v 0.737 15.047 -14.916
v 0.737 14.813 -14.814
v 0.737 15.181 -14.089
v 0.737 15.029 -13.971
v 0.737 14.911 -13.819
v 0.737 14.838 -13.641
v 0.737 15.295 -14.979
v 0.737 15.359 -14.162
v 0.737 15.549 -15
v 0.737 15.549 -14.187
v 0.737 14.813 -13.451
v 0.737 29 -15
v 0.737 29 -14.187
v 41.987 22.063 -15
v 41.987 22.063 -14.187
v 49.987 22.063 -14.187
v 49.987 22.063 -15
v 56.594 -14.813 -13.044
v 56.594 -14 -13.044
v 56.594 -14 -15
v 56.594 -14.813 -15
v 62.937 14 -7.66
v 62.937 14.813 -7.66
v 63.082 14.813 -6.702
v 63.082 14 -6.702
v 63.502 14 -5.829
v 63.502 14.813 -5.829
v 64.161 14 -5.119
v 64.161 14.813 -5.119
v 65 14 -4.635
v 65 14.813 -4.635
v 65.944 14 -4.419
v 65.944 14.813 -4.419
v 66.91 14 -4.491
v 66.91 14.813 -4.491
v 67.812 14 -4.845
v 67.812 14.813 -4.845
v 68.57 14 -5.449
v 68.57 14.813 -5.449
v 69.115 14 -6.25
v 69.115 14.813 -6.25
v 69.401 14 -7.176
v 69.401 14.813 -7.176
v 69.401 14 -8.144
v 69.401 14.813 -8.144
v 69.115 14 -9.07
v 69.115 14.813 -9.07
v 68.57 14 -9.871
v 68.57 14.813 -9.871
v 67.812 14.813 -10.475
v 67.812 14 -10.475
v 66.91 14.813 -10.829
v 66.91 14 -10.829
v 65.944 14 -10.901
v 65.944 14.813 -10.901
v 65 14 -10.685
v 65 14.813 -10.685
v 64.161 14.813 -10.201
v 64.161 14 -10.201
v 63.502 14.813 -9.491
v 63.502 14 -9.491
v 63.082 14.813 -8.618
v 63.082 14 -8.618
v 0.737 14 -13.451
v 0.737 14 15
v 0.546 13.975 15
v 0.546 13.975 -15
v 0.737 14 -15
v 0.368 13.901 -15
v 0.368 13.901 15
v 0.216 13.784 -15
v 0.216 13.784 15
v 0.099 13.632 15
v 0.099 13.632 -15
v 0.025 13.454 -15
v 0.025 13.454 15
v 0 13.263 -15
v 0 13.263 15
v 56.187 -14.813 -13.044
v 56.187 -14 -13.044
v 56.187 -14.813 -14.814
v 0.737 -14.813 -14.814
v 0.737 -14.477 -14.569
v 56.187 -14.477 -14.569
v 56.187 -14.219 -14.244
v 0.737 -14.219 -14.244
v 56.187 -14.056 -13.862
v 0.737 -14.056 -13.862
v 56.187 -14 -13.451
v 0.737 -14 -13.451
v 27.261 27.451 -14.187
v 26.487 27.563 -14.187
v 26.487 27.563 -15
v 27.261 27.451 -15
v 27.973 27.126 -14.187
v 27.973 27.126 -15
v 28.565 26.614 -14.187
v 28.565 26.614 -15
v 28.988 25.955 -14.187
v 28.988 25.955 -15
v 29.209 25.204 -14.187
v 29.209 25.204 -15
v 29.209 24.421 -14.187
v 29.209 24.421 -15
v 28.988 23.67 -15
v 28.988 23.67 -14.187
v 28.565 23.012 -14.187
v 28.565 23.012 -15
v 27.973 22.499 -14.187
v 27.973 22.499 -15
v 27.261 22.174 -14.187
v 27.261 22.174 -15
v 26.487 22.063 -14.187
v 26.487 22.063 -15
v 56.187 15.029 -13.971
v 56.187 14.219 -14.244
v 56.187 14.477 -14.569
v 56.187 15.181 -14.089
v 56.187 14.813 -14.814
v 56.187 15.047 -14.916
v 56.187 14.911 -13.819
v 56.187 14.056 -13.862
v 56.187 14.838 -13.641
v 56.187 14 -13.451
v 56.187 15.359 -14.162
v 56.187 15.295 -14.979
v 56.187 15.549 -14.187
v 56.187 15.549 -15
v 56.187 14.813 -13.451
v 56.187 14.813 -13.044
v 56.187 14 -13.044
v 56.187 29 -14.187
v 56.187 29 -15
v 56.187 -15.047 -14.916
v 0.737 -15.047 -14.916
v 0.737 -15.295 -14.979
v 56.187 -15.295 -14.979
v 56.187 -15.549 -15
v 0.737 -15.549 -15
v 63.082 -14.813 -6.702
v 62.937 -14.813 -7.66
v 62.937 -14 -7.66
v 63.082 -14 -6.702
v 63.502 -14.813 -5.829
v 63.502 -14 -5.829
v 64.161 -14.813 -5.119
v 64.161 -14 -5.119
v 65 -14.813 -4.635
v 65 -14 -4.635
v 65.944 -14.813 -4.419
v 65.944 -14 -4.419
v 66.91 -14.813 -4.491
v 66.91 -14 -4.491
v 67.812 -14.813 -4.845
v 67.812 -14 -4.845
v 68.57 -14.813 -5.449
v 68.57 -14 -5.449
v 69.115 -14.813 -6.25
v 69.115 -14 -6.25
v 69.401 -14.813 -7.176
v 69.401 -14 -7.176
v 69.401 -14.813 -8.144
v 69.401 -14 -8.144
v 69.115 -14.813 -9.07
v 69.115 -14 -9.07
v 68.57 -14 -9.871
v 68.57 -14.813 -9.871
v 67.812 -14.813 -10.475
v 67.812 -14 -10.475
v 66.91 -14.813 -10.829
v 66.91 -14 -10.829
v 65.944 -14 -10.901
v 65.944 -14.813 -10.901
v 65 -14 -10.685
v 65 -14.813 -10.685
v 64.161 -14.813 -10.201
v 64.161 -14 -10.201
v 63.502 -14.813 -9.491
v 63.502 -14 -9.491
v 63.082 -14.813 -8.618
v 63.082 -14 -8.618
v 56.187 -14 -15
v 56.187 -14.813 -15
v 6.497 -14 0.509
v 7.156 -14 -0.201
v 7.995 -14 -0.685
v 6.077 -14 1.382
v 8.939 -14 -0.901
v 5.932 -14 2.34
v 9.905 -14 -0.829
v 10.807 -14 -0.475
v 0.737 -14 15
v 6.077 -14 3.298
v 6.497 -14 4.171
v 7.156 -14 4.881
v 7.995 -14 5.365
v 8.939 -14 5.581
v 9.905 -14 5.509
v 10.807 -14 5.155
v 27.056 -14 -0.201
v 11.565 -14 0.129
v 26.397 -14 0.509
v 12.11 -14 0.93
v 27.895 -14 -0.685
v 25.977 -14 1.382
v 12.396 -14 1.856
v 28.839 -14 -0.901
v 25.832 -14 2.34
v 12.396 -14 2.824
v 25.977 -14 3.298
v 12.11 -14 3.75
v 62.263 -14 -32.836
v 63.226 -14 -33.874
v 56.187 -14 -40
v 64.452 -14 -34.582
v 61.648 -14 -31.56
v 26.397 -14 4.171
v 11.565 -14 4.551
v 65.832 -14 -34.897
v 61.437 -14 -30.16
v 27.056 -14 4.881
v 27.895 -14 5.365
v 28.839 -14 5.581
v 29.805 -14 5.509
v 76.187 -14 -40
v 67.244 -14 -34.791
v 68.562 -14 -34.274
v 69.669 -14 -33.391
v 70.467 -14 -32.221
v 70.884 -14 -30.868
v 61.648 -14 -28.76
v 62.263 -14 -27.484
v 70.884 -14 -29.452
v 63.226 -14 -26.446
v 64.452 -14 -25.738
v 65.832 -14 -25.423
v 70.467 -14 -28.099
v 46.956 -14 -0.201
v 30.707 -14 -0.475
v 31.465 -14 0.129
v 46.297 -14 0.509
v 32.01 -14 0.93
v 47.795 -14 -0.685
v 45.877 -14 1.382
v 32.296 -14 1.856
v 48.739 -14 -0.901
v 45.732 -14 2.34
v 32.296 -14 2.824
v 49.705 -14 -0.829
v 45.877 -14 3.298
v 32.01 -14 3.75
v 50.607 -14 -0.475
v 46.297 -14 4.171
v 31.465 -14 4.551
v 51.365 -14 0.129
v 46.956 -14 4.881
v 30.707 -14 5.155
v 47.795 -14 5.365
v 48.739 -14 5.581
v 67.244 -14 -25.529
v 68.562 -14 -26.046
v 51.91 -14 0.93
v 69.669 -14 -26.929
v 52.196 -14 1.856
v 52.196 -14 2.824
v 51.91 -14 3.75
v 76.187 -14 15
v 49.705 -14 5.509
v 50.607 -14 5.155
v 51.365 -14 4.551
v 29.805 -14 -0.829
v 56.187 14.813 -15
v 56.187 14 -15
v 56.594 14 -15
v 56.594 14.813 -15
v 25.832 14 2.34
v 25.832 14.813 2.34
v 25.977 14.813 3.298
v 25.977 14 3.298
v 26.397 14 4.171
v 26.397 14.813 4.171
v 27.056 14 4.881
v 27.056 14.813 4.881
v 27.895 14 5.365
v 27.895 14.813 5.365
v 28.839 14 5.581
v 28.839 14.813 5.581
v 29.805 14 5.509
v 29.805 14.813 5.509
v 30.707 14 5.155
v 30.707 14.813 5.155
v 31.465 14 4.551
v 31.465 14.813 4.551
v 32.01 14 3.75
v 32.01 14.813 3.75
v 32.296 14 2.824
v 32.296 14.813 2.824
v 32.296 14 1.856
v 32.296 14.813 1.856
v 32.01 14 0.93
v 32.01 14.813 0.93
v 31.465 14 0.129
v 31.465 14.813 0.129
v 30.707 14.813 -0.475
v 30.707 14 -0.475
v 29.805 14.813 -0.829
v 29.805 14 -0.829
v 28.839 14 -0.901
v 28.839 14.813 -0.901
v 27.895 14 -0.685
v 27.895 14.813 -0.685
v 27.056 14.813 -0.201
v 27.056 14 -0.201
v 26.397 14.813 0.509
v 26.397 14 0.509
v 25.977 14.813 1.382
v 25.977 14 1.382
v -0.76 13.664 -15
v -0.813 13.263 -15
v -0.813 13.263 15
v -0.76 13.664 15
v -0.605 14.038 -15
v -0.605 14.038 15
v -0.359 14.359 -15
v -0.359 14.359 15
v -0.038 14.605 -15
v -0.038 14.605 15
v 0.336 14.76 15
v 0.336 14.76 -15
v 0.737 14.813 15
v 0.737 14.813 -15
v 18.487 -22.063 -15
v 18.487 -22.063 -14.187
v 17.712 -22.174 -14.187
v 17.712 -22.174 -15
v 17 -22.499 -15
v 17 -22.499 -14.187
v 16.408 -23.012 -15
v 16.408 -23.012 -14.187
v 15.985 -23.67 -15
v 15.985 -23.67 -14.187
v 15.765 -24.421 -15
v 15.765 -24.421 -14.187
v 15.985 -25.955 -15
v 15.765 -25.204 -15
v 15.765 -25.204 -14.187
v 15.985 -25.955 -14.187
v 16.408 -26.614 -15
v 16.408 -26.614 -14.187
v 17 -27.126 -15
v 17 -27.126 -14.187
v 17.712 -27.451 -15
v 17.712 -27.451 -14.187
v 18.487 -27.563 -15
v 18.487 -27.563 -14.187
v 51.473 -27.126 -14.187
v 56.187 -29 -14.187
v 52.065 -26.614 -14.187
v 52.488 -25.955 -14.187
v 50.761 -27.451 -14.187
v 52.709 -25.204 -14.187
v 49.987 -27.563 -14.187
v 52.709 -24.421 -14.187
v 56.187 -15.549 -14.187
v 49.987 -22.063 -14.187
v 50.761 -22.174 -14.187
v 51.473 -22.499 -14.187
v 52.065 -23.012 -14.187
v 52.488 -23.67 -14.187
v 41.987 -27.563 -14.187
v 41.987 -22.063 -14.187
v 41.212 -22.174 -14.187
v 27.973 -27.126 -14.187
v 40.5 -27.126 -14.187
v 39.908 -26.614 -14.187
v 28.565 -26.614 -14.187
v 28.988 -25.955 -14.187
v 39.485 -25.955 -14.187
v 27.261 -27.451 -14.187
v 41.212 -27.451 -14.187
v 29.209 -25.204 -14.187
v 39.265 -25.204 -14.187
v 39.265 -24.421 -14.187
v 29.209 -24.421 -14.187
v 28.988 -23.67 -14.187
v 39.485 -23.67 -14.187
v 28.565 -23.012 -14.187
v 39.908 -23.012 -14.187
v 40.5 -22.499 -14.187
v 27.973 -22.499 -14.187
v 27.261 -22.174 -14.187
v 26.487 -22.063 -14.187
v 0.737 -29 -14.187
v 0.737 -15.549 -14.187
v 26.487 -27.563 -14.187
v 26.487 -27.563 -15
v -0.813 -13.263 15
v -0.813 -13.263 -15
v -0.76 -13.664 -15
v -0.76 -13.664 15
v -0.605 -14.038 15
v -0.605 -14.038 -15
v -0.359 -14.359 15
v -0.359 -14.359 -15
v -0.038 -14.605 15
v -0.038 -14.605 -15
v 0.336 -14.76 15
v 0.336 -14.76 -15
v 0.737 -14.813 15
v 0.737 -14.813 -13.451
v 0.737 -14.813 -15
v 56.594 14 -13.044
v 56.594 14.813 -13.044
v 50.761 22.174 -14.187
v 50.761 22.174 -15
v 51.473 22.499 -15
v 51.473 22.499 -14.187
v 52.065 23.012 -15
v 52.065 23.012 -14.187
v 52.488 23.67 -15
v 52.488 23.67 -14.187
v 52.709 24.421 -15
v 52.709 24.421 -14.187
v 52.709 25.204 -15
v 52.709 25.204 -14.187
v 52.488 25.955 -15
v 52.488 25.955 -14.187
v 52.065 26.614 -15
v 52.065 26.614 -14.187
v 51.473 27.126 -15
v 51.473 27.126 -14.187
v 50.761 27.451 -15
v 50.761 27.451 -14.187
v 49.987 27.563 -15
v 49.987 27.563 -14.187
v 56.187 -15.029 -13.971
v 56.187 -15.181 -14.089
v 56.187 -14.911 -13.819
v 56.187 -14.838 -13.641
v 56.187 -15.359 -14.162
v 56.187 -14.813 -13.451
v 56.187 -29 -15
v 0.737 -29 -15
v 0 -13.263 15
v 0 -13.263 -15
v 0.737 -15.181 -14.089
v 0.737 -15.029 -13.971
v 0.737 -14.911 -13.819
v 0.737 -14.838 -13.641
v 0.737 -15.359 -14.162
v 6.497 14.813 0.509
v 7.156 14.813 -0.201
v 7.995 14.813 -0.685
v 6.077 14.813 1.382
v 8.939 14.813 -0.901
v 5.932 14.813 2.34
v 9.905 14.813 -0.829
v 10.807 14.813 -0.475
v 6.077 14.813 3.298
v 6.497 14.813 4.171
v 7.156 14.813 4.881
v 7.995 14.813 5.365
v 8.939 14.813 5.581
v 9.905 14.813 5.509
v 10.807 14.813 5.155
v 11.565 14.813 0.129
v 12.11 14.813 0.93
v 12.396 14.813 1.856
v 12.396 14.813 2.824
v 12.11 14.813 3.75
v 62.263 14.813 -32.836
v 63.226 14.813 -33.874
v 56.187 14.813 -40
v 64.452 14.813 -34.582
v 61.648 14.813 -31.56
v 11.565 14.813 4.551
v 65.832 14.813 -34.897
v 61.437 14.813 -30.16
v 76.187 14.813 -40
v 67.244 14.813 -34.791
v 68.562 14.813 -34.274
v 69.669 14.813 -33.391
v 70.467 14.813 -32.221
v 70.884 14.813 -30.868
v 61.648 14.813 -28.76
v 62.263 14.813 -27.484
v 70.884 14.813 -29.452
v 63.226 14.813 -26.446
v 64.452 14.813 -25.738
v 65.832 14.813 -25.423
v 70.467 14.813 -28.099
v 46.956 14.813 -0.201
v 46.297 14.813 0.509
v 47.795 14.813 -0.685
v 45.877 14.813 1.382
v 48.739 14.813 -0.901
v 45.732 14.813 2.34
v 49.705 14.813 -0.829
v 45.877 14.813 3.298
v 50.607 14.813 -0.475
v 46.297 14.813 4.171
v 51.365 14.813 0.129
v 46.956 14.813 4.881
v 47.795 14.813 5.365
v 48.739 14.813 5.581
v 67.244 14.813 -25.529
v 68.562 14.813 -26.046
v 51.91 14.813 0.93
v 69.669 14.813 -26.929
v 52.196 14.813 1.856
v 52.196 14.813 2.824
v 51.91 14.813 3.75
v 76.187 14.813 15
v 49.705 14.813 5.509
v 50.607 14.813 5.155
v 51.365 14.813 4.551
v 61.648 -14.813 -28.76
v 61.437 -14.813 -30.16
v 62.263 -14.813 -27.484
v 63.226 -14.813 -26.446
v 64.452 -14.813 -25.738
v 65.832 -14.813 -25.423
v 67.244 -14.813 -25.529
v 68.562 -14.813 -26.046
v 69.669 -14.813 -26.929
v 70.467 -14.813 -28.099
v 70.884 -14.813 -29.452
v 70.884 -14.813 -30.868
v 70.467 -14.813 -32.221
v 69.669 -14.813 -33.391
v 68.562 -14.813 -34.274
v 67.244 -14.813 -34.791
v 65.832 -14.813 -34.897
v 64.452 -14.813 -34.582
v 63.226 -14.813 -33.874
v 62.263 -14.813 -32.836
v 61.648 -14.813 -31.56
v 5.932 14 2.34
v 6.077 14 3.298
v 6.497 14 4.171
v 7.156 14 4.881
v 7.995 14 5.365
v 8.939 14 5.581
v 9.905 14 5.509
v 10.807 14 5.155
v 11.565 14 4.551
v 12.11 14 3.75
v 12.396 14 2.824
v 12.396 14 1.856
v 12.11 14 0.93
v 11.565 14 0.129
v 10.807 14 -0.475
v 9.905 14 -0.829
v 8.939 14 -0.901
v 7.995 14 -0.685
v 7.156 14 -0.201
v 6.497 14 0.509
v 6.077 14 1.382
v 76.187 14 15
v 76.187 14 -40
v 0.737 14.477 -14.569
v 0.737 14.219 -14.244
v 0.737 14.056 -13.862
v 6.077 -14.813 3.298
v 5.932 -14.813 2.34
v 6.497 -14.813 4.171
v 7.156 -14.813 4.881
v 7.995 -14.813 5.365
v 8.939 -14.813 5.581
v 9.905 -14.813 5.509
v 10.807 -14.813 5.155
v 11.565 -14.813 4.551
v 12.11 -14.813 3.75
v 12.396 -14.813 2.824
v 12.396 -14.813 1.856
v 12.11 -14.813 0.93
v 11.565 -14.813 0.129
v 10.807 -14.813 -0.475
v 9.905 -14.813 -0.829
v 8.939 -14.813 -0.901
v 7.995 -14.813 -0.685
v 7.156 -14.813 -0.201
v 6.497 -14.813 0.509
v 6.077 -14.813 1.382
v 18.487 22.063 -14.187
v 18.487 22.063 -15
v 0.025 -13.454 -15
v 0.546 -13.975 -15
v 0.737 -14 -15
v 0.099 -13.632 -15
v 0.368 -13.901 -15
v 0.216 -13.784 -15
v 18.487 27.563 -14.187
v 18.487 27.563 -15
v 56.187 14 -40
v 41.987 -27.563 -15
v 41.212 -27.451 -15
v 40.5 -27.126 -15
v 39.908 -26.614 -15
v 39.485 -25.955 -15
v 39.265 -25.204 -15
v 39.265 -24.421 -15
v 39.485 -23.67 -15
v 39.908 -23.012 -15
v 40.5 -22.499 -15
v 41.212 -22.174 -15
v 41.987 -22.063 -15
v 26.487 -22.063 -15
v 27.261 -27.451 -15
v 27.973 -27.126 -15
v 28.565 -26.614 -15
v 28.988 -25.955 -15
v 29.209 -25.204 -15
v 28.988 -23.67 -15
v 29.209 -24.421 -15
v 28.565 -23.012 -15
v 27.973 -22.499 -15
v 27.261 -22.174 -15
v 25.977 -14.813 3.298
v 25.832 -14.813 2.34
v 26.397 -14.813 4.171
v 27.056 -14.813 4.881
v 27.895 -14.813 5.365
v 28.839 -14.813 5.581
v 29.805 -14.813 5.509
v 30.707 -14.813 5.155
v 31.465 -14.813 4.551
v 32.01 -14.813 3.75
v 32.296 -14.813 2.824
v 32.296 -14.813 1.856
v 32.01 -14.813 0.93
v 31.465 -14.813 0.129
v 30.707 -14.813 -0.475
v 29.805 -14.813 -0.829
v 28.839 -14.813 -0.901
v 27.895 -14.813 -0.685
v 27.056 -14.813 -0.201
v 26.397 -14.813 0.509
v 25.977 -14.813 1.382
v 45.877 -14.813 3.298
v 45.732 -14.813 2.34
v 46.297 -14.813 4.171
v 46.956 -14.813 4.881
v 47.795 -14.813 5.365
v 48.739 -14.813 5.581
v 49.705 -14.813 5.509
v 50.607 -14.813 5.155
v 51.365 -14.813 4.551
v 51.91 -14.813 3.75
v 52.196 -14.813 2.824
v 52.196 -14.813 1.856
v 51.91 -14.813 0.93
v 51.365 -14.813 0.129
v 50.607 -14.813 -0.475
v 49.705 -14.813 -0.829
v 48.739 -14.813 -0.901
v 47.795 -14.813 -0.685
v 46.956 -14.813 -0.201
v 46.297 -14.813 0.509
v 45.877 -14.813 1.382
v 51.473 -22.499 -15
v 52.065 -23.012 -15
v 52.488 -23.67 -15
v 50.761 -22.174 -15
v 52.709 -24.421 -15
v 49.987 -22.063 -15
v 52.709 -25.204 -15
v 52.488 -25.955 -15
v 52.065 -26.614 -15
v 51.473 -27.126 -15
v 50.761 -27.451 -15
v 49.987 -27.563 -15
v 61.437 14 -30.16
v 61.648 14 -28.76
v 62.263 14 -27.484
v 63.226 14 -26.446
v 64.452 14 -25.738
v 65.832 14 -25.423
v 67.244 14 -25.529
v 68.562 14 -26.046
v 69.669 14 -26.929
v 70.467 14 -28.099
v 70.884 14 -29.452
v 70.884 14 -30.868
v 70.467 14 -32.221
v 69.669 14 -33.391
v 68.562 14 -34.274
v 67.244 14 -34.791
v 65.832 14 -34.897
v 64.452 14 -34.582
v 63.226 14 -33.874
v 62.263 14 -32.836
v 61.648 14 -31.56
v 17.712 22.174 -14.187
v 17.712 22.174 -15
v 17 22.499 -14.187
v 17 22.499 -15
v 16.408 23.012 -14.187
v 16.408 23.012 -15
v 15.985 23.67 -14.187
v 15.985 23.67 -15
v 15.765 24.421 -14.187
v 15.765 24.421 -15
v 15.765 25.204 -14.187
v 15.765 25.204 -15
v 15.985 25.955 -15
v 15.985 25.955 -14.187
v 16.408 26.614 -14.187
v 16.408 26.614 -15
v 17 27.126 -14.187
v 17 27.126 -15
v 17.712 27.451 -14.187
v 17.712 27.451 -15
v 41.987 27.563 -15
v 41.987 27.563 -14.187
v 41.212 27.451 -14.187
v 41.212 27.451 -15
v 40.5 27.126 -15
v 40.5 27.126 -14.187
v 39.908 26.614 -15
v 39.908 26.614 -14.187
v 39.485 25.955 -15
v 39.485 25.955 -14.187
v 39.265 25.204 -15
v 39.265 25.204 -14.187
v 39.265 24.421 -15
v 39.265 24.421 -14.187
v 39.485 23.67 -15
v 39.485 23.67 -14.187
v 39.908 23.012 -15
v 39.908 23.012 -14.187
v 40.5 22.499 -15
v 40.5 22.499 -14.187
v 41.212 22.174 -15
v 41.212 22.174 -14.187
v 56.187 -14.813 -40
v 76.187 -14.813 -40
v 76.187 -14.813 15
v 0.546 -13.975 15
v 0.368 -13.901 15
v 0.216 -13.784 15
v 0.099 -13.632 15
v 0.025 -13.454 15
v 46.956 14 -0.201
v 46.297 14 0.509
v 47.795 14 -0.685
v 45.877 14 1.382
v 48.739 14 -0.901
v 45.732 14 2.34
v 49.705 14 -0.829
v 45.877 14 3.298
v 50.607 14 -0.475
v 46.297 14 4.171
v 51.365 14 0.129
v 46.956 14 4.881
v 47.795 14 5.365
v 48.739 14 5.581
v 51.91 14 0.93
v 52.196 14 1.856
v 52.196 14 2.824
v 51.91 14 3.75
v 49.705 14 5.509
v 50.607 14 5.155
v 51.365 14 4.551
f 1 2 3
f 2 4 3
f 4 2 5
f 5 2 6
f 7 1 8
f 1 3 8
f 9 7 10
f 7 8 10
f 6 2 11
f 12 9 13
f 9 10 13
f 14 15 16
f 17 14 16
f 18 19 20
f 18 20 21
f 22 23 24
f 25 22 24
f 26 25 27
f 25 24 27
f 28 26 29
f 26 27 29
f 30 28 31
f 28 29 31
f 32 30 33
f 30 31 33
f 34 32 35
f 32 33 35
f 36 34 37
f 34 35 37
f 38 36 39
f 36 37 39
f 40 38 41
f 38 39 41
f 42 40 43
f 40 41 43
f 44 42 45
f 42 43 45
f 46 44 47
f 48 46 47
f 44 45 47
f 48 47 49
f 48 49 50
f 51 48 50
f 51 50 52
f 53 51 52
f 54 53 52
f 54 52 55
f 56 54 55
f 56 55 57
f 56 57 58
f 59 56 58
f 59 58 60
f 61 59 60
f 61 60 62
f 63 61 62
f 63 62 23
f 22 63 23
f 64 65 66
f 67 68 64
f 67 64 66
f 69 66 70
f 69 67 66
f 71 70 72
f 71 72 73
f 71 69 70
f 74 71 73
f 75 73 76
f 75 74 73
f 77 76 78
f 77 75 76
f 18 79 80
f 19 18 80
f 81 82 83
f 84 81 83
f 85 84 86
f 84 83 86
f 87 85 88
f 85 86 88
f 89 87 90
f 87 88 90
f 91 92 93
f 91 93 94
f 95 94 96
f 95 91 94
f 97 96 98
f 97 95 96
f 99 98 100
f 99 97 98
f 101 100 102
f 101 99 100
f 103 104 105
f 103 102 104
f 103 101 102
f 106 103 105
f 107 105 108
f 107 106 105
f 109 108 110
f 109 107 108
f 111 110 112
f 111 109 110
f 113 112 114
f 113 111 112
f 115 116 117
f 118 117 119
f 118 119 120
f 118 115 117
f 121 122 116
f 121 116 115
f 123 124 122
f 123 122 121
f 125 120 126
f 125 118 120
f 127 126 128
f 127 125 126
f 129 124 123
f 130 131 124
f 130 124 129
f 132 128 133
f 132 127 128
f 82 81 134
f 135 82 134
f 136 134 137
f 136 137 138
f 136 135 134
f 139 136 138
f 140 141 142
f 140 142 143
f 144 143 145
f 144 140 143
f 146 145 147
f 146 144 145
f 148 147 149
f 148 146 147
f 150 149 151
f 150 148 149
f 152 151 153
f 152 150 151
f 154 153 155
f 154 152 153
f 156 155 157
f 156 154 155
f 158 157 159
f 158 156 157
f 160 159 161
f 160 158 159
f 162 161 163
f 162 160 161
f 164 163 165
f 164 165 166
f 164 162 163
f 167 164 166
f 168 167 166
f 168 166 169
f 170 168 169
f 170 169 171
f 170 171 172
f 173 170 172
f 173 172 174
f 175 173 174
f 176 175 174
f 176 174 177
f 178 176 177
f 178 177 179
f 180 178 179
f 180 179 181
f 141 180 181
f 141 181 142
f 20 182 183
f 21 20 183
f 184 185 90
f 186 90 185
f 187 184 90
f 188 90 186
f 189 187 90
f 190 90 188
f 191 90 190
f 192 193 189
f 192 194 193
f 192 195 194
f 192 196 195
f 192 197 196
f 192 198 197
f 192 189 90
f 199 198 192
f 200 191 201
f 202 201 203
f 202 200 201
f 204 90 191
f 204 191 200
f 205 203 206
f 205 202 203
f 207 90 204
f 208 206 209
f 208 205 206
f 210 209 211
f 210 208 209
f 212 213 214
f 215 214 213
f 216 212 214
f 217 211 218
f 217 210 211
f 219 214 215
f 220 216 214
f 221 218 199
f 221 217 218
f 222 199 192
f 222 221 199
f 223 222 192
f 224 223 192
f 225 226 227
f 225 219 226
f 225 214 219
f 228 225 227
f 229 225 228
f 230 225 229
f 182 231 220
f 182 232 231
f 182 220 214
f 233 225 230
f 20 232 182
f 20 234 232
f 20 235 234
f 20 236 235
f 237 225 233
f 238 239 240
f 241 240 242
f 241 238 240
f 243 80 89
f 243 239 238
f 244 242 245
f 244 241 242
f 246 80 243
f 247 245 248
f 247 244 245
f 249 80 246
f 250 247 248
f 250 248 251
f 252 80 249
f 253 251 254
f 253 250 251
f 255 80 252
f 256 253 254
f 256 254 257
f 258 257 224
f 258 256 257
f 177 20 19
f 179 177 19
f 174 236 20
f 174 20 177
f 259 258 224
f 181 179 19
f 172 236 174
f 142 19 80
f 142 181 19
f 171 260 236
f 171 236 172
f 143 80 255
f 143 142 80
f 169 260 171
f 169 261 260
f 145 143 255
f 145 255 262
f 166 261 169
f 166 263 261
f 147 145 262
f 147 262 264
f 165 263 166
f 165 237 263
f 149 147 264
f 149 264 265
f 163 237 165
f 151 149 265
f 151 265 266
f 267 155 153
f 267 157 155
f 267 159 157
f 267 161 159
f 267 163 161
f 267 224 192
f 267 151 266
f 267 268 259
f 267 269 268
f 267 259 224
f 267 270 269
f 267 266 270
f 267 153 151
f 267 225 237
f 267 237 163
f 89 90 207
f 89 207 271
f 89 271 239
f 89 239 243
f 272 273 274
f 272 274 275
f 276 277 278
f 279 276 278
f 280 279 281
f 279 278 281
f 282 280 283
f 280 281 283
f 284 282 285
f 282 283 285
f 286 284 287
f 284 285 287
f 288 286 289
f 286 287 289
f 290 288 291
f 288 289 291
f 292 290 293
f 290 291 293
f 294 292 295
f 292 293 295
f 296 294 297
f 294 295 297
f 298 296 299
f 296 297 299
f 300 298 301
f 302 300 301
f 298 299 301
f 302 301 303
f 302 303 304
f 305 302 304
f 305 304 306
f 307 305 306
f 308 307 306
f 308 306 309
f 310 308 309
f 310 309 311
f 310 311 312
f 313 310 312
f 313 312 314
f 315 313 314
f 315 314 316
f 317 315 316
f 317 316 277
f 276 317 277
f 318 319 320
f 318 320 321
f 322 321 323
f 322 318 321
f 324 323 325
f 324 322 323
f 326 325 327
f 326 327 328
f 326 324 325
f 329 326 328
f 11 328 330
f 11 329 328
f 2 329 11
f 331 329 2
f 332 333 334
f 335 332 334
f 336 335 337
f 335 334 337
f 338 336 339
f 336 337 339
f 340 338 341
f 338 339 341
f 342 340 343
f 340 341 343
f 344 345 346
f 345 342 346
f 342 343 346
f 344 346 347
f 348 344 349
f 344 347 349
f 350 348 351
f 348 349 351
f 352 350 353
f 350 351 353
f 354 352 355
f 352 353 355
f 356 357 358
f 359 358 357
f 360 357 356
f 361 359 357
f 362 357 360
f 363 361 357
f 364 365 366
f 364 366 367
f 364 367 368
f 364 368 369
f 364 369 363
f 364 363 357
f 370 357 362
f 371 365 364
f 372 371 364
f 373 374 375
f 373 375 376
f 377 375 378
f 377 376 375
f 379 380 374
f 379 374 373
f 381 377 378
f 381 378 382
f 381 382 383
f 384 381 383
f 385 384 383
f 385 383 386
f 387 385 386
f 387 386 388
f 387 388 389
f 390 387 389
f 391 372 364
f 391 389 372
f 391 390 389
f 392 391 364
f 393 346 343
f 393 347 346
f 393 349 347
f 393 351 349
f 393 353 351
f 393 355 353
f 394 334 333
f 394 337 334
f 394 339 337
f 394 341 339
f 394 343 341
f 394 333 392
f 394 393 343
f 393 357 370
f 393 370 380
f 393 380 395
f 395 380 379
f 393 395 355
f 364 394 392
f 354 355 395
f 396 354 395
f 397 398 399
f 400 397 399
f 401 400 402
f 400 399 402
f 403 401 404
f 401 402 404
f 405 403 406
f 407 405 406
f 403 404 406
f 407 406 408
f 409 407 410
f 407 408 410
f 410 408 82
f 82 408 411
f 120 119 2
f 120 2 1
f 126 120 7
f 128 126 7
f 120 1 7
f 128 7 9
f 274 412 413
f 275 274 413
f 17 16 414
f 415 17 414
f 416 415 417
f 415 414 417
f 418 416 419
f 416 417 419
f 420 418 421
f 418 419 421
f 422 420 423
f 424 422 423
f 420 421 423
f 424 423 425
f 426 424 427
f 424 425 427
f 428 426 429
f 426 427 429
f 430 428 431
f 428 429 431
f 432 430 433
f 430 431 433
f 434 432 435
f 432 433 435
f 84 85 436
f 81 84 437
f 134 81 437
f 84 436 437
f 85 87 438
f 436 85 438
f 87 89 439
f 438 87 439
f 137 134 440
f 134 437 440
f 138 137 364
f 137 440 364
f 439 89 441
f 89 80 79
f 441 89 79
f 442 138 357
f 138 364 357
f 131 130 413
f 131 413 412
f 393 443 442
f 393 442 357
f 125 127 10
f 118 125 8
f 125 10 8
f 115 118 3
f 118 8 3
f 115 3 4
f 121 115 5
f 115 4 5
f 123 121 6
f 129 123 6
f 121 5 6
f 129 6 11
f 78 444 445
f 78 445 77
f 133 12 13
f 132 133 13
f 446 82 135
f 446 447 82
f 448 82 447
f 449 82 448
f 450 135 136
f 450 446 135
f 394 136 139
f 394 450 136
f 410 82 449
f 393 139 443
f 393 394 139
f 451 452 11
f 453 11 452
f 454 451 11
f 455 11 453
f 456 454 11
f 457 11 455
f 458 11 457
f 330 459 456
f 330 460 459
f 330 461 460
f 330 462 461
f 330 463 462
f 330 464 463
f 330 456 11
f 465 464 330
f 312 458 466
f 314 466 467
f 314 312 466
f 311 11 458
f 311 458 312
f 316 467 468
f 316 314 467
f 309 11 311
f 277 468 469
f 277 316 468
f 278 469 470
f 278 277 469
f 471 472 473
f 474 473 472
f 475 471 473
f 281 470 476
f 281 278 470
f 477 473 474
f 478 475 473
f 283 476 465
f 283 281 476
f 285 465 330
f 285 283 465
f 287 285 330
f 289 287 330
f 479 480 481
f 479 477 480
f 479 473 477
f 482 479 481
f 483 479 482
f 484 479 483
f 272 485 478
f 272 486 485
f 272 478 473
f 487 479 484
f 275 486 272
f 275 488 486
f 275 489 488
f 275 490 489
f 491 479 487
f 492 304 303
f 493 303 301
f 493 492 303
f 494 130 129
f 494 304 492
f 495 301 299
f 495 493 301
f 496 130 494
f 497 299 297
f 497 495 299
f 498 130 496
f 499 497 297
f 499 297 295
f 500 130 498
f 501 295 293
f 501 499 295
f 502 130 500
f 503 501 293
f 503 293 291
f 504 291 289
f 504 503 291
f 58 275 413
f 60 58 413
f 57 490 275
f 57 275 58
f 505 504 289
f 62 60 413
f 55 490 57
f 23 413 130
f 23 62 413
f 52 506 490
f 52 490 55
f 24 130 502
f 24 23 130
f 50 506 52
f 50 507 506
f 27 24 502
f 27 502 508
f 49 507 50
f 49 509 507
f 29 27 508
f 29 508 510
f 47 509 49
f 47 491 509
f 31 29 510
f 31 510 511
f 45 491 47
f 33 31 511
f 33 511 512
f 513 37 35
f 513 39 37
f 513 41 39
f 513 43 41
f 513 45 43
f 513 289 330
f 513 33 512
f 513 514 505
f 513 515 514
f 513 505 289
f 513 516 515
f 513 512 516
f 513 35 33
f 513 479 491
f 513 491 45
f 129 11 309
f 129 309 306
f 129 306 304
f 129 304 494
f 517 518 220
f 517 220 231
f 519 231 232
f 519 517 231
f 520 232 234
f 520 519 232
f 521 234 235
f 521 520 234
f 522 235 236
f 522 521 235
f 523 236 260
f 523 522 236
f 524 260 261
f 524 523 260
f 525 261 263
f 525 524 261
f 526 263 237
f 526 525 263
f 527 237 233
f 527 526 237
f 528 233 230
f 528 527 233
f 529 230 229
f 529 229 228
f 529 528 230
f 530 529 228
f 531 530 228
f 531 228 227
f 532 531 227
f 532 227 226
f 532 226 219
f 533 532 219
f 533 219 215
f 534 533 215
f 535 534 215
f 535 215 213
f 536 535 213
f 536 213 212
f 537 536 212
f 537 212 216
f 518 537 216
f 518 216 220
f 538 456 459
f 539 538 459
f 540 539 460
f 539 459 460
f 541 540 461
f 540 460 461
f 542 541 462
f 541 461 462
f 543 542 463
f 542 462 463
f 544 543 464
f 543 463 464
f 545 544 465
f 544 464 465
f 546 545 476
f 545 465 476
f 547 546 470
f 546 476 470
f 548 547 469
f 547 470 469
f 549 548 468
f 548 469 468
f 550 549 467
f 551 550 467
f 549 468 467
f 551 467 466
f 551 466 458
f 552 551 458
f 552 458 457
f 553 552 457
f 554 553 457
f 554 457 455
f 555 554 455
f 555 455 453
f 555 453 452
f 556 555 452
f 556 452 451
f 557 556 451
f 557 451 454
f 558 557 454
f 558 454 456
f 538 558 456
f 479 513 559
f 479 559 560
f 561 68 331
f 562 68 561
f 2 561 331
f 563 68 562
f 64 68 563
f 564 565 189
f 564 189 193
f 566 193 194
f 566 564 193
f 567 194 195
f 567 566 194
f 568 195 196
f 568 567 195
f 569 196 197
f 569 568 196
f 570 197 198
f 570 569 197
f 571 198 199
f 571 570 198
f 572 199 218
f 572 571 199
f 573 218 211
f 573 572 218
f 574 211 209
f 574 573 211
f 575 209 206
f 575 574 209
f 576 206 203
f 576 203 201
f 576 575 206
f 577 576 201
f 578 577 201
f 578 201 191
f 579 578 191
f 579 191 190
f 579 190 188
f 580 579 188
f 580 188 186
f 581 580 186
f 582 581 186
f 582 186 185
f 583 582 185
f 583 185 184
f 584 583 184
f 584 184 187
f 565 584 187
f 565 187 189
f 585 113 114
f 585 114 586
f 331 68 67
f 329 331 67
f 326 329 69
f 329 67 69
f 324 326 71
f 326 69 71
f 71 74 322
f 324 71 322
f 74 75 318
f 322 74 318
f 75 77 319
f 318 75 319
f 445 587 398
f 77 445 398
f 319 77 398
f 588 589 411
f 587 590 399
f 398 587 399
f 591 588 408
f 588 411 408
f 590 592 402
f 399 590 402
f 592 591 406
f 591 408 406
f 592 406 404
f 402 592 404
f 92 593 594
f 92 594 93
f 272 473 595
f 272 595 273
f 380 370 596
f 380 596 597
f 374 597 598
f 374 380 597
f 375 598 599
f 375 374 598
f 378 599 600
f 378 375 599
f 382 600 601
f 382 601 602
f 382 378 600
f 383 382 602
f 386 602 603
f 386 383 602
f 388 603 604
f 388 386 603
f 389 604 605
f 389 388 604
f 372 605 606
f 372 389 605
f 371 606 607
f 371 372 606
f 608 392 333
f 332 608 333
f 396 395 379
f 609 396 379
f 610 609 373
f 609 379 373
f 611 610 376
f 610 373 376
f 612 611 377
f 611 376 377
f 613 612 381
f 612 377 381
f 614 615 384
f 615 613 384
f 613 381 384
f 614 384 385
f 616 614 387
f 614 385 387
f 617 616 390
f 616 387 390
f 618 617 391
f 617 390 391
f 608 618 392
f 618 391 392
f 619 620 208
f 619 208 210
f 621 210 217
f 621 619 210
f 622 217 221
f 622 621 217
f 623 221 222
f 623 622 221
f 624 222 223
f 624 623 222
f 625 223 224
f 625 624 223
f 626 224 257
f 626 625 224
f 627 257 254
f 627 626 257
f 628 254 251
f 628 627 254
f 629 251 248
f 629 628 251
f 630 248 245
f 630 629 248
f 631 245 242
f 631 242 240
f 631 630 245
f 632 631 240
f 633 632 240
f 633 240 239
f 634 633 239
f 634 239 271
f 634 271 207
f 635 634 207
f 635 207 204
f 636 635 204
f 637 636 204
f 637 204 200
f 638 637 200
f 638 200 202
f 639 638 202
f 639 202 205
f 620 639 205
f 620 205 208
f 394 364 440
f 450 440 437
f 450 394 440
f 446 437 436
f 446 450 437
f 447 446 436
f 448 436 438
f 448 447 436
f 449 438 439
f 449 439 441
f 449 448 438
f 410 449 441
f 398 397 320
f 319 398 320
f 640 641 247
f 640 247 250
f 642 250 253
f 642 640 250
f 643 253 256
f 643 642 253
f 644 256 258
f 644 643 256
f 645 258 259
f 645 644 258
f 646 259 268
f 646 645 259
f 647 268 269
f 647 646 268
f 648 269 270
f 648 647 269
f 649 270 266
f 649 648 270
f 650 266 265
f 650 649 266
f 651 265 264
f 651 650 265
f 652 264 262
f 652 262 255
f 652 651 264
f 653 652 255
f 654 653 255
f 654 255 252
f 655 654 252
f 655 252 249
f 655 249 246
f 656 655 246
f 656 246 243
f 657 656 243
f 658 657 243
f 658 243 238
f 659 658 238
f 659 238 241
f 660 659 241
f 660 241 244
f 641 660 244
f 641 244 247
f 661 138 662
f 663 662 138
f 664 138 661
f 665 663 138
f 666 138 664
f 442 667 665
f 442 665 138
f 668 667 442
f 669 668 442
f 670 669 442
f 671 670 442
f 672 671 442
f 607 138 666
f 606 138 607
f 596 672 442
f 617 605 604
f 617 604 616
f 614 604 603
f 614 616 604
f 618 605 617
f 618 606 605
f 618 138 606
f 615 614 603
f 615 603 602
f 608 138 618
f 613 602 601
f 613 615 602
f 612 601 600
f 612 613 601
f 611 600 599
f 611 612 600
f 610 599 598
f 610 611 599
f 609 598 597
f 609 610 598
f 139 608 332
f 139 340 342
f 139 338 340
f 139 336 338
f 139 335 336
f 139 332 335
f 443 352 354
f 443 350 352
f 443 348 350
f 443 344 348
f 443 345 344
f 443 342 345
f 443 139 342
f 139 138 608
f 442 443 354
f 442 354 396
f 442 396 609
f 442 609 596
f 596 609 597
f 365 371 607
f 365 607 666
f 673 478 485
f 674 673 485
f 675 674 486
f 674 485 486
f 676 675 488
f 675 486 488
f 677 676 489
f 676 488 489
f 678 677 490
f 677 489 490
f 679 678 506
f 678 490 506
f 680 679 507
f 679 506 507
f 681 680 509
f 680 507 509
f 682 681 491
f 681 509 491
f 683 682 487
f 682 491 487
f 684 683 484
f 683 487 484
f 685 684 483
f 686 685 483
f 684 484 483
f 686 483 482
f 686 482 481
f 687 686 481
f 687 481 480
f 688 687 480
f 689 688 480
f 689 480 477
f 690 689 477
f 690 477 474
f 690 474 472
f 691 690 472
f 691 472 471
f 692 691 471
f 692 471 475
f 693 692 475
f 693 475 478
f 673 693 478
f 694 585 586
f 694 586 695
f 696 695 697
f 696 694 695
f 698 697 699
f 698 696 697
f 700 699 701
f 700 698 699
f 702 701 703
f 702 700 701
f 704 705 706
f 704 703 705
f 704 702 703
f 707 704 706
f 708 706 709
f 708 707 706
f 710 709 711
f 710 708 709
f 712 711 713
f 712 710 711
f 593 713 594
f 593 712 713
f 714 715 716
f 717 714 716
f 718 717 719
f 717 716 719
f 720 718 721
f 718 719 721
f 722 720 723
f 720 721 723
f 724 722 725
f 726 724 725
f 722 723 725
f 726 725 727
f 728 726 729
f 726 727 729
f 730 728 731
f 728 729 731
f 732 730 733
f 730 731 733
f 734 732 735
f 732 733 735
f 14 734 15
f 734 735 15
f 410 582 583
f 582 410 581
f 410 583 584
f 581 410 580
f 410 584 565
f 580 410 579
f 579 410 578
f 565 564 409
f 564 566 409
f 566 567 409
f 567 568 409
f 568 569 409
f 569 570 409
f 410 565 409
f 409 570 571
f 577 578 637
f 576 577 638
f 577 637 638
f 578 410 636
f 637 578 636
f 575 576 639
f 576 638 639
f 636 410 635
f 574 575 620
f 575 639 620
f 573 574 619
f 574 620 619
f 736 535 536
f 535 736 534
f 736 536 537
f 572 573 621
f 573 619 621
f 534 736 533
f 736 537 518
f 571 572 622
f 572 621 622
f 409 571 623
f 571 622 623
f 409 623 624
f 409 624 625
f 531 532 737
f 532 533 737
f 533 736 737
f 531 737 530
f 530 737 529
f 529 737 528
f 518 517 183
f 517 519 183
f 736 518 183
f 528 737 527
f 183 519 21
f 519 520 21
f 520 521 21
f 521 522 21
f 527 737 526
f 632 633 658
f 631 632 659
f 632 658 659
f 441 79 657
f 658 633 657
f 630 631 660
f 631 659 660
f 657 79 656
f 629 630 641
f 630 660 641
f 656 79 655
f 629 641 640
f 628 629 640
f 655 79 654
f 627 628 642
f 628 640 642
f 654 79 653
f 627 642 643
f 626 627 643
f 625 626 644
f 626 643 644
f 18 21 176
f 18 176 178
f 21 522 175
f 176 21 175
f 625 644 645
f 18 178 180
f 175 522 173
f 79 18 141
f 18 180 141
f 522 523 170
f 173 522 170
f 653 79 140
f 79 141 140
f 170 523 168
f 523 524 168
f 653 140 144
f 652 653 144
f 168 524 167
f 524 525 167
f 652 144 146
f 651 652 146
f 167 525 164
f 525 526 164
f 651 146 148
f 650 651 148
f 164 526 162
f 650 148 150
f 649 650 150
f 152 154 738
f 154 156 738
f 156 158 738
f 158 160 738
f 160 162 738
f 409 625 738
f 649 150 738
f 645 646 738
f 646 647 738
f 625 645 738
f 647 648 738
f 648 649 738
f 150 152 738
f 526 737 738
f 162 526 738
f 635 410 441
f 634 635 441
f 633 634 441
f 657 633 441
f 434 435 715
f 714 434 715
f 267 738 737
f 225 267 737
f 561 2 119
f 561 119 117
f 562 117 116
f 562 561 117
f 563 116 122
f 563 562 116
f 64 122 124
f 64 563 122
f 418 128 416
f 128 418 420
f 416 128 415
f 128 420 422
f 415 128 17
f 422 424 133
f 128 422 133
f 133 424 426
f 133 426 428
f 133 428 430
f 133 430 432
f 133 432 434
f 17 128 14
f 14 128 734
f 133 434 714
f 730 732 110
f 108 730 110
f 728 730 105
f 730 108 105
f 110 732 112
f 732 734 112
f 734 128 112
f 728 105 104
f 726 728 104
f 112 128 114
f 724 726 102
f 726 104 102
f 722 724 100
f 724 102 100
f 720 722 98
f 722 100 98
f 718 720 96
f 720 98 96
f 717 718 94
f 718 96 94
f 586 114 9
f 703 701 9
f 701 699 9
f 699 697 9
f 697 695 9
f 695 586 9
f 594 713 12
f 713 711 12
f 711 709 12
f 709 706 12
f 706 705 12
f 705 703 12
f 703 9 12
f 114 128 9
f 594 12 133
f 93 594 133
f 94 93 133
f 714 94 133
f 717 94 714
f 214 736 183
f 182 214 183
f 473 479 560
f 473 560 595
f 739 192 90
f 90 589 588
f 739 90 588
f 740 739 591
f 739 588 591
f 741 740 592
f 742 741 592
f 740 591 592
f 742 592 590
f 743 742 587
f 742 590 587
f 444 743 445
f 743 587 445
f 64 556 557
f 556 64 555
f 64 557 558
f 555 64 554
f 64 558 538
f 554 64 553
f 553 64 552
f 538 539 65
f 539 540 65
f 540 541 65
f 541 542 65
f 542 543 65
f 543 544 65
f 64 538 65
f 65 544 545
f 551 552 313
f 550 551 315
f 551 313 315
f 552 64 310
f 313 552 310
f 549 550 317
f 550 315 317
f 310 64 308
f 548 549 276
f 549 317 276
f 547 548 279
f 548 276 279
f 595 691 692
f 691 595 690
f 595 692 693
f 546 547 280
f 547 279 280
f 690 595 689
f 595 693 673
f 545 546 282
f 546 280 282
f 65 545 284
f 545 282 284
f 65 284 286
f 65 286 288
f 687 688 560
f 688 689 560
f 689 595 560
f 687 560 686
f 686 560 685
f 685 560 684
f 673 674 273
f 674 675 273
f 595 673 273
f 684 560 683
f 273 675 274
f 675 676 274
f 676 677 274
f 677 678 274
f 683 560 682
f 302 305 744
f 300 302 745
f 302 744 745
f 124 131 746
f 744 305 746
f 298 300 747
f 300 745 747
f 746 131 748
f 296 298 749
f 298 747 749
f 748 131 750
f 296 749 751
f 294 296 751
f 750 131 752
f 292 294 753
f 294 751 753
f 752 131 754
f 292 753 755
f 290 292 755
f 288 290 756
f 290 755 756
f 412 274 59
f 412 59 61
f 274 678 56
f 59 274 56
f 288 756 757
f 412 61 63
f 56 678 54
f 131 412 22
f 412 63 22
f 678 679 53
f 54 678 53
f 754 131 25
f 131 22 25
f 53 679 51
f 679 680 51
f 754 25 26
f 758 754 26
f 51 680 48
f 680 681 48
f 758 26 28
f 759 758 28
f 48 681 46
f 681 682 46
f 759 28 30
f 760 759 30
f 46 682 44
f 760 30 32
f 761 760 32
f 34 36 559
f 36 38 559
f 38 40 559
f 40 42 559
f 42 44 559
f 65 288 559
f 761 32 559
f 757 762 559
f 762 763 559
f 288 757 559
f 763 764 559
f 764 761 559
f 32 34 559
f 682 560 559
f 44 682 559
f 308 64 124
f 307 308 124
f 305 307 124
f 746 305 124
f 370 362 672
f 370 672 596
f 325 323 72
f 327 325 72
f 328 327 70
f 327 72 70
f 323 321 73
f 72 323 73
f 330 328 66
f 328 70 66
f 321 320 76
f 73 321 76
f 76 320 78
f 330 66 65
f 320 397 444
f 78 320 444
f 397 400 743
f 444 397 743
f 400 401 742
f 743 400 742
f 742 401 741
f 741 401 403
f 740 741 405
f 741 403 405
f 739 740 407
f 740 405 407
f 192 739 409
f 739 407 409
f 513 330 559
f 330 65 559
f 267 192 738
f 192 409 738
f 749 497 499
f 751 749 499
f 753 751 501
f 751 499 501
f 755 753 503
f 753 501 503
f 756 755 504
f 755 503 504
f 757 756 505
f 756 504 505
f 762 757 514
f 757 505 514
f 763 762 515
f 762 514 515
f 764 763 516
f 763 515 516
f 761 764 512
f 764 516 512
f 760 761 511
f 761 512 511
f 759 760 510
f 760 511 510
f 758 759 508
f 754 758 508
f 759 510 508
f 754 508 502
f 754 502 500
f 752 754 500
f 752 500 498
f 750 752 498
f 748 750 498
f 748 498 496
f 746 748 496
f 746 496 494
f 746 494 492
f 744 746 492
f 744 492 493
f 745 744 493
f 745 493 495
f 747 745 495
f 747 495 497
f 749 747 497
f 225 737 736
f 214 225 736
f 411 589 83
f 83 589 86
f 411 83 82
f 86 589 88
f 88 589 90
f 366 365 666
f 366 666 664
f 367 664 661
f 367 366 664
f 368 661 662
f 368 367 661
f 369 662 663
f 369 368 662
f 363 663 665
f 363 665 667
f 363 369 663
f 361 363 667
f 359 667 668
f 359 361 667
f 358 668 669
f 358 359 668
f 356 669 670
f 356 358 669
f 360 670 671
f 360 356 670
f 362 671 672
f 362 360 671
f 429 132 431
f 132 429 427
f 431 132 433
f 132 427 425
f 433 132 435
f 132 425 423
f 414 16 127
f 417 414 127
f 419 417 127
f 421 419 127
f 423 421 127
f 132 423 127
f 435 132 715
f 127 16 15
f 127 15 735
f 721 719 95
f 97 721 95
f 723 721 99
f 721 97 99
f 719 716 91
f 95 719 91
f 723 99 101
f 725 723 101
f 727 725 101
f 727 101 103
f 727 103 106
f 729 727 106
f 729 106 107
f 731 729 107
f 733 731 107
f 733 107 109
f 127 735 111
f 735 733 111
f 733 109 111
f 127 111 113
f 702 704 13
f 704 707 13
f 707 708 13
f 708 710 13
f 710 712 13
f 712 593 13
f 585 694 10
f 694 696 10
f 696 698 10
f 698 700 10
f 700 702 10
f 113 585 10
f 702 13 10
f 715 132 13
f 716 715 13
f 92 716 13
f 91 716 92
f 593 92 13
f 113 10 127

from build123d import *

# Parameters (mm, degrees)
SKETCH7_W                    = 29.6256
SKETCH7_H                    = 30
BASE_FLANGE2_DEPTH           = 0.8128
EDGE_FLANGE1_STRIP_W         = 4.7244
EDGE_FLANGE1_STRIP_H         = 0.8128
EDGE_FLANGE1_STRIP_CUT_DEPTH = 30
EDGE_FLANGE1_DEPTH           = 30
EDGE_FLANGE1_FLAT_DEPTH      = 0.8128
EDGE_FLANGE3_START           = 0.7366
EDGE_FLANGE3_DEPTH           = 55.857
EDGE_FLANGE3_START_2         = 56.1872
EDGE_FLANGE3_2_DEPTH         = 0.4064
EDGE_FLANGE3_3_DEPTH         = 55.4506
CUT_EXTRUDE1_REACH           = 93.006
SKETCH21_R                   = 4.75
SKETCH21_R_2                 = 3.25
CUT_EXTRUDE2_REACH           = 88.587


# Read off the part's stored shape, not the designer's step: Edge-Flange3
# Sheet-metal steps are written as plain solids
with BuildPart() as part:
    # Sketch7 → Base-Flange2 (new body)
    with BuildSketch(Plane.YZ):
        Rectangle(SKETCH7_W, SKETCH7_H)
    extrude(amount=-BASE_FLANGE2_DEPTH)

    # Edge-Flange1 strip (across the edge) → Edge-Flange1 strip cut (cut)
    with BuildSketch(Plane(origin=(0, 14.8128, -15), x_dir=(0, -1, 0), z_dir=(0, 0, 1))):
        with Locations((-0.8128, -0.4064)):
            Rectangle(EDGE_FLANGE1_STRIP_W, EDGE_FLANGE1_STRIP_H)
    edge_flange1_strip_cut = extrude(amount=EDGE_FLANGE1_STRIP_CUT_DEPTH, mode=Mode.SUBTRACT)

    # Edge-Flange1 bend section (across the edge) → Edge-Flange1 (add)
    with BuildSketch(Plane(origin=(0, 14.8128, -15), x_dir=(0, -1, 0), z_dir=(0, 0, 1))):
        with BuildLine():
            Line((0, 0.7366), (0.8128, 0.7366))
            ThreePointArc((0.8128, 0.7366), (1.028545145, 0.215745145), (1.5494, 0))
            Line((1.5494, 0), (1.5494, -0.8128))
            ThreePointArc((1.5494, -0.8128), (0.453808753, -0.358991247), (0, 0.7366))
        make_face()
    edge_flange1 = extrude(amount=EDGE_FLANGE1_DEPTH)

    # Edge-Flange1 profile (on flange) → Edge-Flange1 flat (add)
    with BuildSketch(Plane.ZX.offset(14.8128)):
        Polygon((-40, 56.1872), (-15, 56.1872), (-15, 0.7366), (15, 0.7366), (15, 76.1872), (-40, 76.1872), align=None)
    edge_flange1_flat = extrude(amount=-EDGE_FLANGE1_FLAT_DEPTH)

    # Edge-Flange3 outline → Edge-Flange3 (cut)
    with BuildSketch(Plane.YZ.offset(EDGE_FLANGE3_START)):
        with BuildLine():
            Line((14.8128, -15), (14.8128, -14.813707039))
            ThreePointArc((14.8128, -14.813707039), (14.218624211, -14.244121367), (14, -13.4506))
            Line((14, -13.4506), (14, -15))
            Line((14, -15), (14.8128, -15))
        make_face()
    edge_flange3 = extrude(amount=EDGE_FLANGE3_DEPTH, mode=Mode.SUBTRACT)

    # Edge-Flange3 2 outline → Edge-Flange3 2 (cut)
    with BuildSketch(Plane.YZ.offset(EDGE_FLANGE3_START_2)):
        with BuildLine():
            ThreePointArc((14, -13.4506), (14.218624211, -14.244121367), (14.8128, -14.813707039))
            Line((14.8128, -14.813707039), (14.8128, -13.0442))
            Line((14.8128, -13.0442), (14, -13.0442))
            Line((14, -13.0442), (14, -13.4506))
        make_face()
    edge_flange3_2 = extrude(amount=EDGE_FLANGE3_2_DEPTH, mode=Mode.SUBTRACT)

    # Edge-Flange3 3 outline → Edge-Flange3 3 (add)
    with BuildSketch(Plane.YZ.offset(EDGE_FLANGE3_START)):
        with BuildLine():
            Line((15.5494, -15), (29, -15))
            Line((29, -15), (29, -14.1872))
            Line((29, -14.1872), (15.5494, -14.1872))
            ThreePointArc((15.5494, -14.1872), (15.028545145, -13.971454855), (14.8128, -13.4506))
            Line((14.8128, -13.4506), (14.8128, -14.813707039))
            ThreePointArc((14.8128, -14.813707039), (15.169503755, -14.952704924), (15.5494, -15))
        make_face()
    edge_flange3_3 = extrude(amount=EDGE_FLANGE3_3_DEPTH)

    # Sketch21 → Cut-Extrude1 (cut, up to next)
    with BuildSketch(Plane(origin=(0, 14.8128, 0), x_dir=(-1, 0, 0), z_dir=(0, 1, 0)), mode=Mode.PRIVATE) as cut_extrude1_sk1:
        with Locations((-66.1872, -30.16)):
            Circle(SKETCH21_R)
    cut_extrude1_tool1 = extrude(cut_extrude1_sk1.sketch, amount=-CUT_EXTRUDE1_REACH, mode=Mode.PRIVATE) & part.part
    # Sketch21 → Cut-Extrude1 (cut, up to next)
    with BuildSketch(Plane(origin=(0, 14.8128, 0), x_dir=(-1, 0, 0), z_dir=(0, 1, 0)), mode=Mode.PRIVATE) as cut_extrude1_sk2:
        with Locations((-66.1872, -7.66)):
            Circle(SKETCH21_R_2)
    cut_extrude1_tool2 = extrude(cut_extrude1_sk2.sketch, amount=-CUT_EXTRUDE1_REACH, mode=Mode.PRIVATE) & part.part
    # Sketch21 → Cut-Extrude1 (cut, up to next)
    with BuildSketch(Plane(origin=(0, 14.8128, 0), x_dir=(-1, 0, 0), z_dir=(0, 1, 0)), mode=Mode.PRIVATE) as cut_extrude1_sk3:
        with Locations((-48.982258849, 2.34)):
            Circle(SKETCH21_R_2)
    cut_extrude1_tool3 = extrude(cut_extrude1_sk3.sketch, amount=-CUT_EXTRUDE1_REACH, mode=Mode.PRIVATE) & part.part
    # Sketch21 → Cut-Extrude1 (cut, up to next)
    with BuildSketch(Plane(origin=(0, 14.8128, 0), x_dir=(-1, 0, 0), z_dir=(0, 1, 0)), mode=Mode.PRIVATE) as cut_extrude1_sk4:
        with Locations((-29.082258849, 2.34)):
            Circle(SKETCH21_R_2)
    cut_extrude1_tool4 = extrude(cut_extrude1_sk4.sketch, amount=-CUT_EXTRUDE1_REACH, mode=Mode.PRIVATE) & part.part
    # Sketch21 → Cut-Extrude1 (cut, up to next)
    with BuildSketch(Plane(origin=(0, 14.8128, 0), x_dir=(-1, 0, 0), z_dir=(0, 1, 0)), mode=Mode.PRIVATE) as cut_extrude1_sk5:
        with Locations((-9.182258849, 2.34)):
            Circle(SKETCH21_R_2)
    cut_extrude1_tool5 = extrude(cut_extrude1_sk5.sketch, amount=-CUT_EXTRUDE1_REACH, mode=Mode.PRIVATE) & part.part
    cut_extrude1_1 = cut_extrude1_tool1.solids().sort_by_distance((66.1872, 14.8128, -30.16))[0]
    add(cut_extrude1_1, mode=Mode.SUBTRACT)
    cut_extrude1_2 = cut_extrude1_tool2.solids().sort_by_distance((66.1872, 14.8128, -7.66))[0]
    add(cut_extrude1_2, mode=Mode.SUBTRACT)
    cut_extrude1_3 = cut_extrude1_tool3.solids().sort_by_distance((48.982259, 14.8128, 2.34))[0]
    add(cut_extrude1_3, mode=Mode.SUBTRACT)
    cut_extrude1_4 = cut_extrude1_tool4.solids().sort_by_distance((29.082259, 14.8128, 2.34))[0]
    add(cut_extrude1_4, mode=Mode.SUBTRACT)
    cut_extrude1_5 = cut_extrude1_tool5.solids().sort_by_distance((9.182259, 14.8128, 2.34))[0]
    add(cut_extrude1_5, mode=Mode.SUBTRACT)
    cut_extrude1 = cut_extrude1_1 + cut_extrude1_2 + cut_extrude1_3 + cut_extrude1_4 + cut_extrude1_5  # Cut-Extrude1 as one shape, for the pattern or mirror that repeats it

    # Sketch22 → Cut-Extrude2 (cut, up to next)
    with BuildSketch(Plane.XY.offset(-14.1872), mode=Mode.PRIVATE) as cut_extrude2_sk1:
        with BuildLine():
            Line((18.4866, 27.5628), (26.4866, 27.5628))
            ThreePointArc((26.4866, 27.5628), (29.2366, 24.8128), (26.4866, 22.0628))
            Line((26.4866, 22.0628), (18.4866, 22.0628))
            ThreePointArc((18.4866, 22.0628), (15.7366, 24.8128), (18.4866, 27.5628))
        make_face()
    cut_extrude2_tool1 = extrude(cut_extrude2_sk1.sketch, amount=-CUT_EXTRUDE2_REACH, mode=Mode.PRIVATE) & part.part
    # Sketch22 → Cut-Extrude2 (cut, up to next)
    with BuildSketch(Plane.XY.offset(-14.1872), mode=Mode.PRIVATE) as cut_extrude2_sk2:
        with BuildLine():
            Line((49.9866, 27.5628), (41.9866, 27.5628))
            ThreePointArc((41.9866, 27.5628), (39.2366, 24.8128), (41.9866, 22.0628))
            Line((41.9866, 22.0628), (49.9866, 22.0628))
            ThreePointArc((49.9866, 22.0628), (52.7366, 24.8128), (49.9866, 27.5628))
        make_face()
    cut_extrude2_tool2 = extrude(cut_extrude2_sk2.sketch, amount=-CUT_EXTRUDE2_REACH, mode=Mode.PRIVATE) & part.part
    cut_extrude2_1 = cut_extrude2_tool1.solids().sort_by_distance((22.4866, 24.8128, -14.1872))[0]
    add(cut_extrude2_1, mode=Mode.SUBTRACT)
    cut_extrude2_2 = cut_extrude2_tool2.solids().sort_by_distance((45.9866, 24.8128, -14.1872))[0]
    add(cut_extrude2_2, mode=Mode.SUBTRACT)
    cut_extrude2 = cut_extrude2_1 + cut_extrude2_2  # Cut-Extrude2 as one shape, for the pattern or mirror that repeats it

    # Mirror1: Edge-Flange1 strip cut, Edge-Flange1, Edge-Flange1 flat, Edge-Flange3, Edge-Flange3 2, Edge-Flange3 3, Cut-Extrude1, Cut-Extrude2 across plane
    add(edge_flange1_strip_cut.mirror(Plane.ZX), mode=Mode.SUBTRACT)
    add(edge_flange1.mirror(Plane.ZX))
    add(edge_flange1_flat.mirror(Plane.ZX))
    add(edge_flange3.mirror(Plane.ZX), mode=Mode.SUBTRACT)
    add(edge_flange3_2.mirror(Plane.ZX), mode=Mode.SUBTRACT)
    add(edge_flange3_3.mirror(Plane.ZX))
    add(cut_extrude1.mirror(Plane.ZX), mode=Mode.SUBTRACT)
    add(cut_extrude2.mirror(Plane.ZX), mode=Mode.SUBTRACT)


solid = part.part
